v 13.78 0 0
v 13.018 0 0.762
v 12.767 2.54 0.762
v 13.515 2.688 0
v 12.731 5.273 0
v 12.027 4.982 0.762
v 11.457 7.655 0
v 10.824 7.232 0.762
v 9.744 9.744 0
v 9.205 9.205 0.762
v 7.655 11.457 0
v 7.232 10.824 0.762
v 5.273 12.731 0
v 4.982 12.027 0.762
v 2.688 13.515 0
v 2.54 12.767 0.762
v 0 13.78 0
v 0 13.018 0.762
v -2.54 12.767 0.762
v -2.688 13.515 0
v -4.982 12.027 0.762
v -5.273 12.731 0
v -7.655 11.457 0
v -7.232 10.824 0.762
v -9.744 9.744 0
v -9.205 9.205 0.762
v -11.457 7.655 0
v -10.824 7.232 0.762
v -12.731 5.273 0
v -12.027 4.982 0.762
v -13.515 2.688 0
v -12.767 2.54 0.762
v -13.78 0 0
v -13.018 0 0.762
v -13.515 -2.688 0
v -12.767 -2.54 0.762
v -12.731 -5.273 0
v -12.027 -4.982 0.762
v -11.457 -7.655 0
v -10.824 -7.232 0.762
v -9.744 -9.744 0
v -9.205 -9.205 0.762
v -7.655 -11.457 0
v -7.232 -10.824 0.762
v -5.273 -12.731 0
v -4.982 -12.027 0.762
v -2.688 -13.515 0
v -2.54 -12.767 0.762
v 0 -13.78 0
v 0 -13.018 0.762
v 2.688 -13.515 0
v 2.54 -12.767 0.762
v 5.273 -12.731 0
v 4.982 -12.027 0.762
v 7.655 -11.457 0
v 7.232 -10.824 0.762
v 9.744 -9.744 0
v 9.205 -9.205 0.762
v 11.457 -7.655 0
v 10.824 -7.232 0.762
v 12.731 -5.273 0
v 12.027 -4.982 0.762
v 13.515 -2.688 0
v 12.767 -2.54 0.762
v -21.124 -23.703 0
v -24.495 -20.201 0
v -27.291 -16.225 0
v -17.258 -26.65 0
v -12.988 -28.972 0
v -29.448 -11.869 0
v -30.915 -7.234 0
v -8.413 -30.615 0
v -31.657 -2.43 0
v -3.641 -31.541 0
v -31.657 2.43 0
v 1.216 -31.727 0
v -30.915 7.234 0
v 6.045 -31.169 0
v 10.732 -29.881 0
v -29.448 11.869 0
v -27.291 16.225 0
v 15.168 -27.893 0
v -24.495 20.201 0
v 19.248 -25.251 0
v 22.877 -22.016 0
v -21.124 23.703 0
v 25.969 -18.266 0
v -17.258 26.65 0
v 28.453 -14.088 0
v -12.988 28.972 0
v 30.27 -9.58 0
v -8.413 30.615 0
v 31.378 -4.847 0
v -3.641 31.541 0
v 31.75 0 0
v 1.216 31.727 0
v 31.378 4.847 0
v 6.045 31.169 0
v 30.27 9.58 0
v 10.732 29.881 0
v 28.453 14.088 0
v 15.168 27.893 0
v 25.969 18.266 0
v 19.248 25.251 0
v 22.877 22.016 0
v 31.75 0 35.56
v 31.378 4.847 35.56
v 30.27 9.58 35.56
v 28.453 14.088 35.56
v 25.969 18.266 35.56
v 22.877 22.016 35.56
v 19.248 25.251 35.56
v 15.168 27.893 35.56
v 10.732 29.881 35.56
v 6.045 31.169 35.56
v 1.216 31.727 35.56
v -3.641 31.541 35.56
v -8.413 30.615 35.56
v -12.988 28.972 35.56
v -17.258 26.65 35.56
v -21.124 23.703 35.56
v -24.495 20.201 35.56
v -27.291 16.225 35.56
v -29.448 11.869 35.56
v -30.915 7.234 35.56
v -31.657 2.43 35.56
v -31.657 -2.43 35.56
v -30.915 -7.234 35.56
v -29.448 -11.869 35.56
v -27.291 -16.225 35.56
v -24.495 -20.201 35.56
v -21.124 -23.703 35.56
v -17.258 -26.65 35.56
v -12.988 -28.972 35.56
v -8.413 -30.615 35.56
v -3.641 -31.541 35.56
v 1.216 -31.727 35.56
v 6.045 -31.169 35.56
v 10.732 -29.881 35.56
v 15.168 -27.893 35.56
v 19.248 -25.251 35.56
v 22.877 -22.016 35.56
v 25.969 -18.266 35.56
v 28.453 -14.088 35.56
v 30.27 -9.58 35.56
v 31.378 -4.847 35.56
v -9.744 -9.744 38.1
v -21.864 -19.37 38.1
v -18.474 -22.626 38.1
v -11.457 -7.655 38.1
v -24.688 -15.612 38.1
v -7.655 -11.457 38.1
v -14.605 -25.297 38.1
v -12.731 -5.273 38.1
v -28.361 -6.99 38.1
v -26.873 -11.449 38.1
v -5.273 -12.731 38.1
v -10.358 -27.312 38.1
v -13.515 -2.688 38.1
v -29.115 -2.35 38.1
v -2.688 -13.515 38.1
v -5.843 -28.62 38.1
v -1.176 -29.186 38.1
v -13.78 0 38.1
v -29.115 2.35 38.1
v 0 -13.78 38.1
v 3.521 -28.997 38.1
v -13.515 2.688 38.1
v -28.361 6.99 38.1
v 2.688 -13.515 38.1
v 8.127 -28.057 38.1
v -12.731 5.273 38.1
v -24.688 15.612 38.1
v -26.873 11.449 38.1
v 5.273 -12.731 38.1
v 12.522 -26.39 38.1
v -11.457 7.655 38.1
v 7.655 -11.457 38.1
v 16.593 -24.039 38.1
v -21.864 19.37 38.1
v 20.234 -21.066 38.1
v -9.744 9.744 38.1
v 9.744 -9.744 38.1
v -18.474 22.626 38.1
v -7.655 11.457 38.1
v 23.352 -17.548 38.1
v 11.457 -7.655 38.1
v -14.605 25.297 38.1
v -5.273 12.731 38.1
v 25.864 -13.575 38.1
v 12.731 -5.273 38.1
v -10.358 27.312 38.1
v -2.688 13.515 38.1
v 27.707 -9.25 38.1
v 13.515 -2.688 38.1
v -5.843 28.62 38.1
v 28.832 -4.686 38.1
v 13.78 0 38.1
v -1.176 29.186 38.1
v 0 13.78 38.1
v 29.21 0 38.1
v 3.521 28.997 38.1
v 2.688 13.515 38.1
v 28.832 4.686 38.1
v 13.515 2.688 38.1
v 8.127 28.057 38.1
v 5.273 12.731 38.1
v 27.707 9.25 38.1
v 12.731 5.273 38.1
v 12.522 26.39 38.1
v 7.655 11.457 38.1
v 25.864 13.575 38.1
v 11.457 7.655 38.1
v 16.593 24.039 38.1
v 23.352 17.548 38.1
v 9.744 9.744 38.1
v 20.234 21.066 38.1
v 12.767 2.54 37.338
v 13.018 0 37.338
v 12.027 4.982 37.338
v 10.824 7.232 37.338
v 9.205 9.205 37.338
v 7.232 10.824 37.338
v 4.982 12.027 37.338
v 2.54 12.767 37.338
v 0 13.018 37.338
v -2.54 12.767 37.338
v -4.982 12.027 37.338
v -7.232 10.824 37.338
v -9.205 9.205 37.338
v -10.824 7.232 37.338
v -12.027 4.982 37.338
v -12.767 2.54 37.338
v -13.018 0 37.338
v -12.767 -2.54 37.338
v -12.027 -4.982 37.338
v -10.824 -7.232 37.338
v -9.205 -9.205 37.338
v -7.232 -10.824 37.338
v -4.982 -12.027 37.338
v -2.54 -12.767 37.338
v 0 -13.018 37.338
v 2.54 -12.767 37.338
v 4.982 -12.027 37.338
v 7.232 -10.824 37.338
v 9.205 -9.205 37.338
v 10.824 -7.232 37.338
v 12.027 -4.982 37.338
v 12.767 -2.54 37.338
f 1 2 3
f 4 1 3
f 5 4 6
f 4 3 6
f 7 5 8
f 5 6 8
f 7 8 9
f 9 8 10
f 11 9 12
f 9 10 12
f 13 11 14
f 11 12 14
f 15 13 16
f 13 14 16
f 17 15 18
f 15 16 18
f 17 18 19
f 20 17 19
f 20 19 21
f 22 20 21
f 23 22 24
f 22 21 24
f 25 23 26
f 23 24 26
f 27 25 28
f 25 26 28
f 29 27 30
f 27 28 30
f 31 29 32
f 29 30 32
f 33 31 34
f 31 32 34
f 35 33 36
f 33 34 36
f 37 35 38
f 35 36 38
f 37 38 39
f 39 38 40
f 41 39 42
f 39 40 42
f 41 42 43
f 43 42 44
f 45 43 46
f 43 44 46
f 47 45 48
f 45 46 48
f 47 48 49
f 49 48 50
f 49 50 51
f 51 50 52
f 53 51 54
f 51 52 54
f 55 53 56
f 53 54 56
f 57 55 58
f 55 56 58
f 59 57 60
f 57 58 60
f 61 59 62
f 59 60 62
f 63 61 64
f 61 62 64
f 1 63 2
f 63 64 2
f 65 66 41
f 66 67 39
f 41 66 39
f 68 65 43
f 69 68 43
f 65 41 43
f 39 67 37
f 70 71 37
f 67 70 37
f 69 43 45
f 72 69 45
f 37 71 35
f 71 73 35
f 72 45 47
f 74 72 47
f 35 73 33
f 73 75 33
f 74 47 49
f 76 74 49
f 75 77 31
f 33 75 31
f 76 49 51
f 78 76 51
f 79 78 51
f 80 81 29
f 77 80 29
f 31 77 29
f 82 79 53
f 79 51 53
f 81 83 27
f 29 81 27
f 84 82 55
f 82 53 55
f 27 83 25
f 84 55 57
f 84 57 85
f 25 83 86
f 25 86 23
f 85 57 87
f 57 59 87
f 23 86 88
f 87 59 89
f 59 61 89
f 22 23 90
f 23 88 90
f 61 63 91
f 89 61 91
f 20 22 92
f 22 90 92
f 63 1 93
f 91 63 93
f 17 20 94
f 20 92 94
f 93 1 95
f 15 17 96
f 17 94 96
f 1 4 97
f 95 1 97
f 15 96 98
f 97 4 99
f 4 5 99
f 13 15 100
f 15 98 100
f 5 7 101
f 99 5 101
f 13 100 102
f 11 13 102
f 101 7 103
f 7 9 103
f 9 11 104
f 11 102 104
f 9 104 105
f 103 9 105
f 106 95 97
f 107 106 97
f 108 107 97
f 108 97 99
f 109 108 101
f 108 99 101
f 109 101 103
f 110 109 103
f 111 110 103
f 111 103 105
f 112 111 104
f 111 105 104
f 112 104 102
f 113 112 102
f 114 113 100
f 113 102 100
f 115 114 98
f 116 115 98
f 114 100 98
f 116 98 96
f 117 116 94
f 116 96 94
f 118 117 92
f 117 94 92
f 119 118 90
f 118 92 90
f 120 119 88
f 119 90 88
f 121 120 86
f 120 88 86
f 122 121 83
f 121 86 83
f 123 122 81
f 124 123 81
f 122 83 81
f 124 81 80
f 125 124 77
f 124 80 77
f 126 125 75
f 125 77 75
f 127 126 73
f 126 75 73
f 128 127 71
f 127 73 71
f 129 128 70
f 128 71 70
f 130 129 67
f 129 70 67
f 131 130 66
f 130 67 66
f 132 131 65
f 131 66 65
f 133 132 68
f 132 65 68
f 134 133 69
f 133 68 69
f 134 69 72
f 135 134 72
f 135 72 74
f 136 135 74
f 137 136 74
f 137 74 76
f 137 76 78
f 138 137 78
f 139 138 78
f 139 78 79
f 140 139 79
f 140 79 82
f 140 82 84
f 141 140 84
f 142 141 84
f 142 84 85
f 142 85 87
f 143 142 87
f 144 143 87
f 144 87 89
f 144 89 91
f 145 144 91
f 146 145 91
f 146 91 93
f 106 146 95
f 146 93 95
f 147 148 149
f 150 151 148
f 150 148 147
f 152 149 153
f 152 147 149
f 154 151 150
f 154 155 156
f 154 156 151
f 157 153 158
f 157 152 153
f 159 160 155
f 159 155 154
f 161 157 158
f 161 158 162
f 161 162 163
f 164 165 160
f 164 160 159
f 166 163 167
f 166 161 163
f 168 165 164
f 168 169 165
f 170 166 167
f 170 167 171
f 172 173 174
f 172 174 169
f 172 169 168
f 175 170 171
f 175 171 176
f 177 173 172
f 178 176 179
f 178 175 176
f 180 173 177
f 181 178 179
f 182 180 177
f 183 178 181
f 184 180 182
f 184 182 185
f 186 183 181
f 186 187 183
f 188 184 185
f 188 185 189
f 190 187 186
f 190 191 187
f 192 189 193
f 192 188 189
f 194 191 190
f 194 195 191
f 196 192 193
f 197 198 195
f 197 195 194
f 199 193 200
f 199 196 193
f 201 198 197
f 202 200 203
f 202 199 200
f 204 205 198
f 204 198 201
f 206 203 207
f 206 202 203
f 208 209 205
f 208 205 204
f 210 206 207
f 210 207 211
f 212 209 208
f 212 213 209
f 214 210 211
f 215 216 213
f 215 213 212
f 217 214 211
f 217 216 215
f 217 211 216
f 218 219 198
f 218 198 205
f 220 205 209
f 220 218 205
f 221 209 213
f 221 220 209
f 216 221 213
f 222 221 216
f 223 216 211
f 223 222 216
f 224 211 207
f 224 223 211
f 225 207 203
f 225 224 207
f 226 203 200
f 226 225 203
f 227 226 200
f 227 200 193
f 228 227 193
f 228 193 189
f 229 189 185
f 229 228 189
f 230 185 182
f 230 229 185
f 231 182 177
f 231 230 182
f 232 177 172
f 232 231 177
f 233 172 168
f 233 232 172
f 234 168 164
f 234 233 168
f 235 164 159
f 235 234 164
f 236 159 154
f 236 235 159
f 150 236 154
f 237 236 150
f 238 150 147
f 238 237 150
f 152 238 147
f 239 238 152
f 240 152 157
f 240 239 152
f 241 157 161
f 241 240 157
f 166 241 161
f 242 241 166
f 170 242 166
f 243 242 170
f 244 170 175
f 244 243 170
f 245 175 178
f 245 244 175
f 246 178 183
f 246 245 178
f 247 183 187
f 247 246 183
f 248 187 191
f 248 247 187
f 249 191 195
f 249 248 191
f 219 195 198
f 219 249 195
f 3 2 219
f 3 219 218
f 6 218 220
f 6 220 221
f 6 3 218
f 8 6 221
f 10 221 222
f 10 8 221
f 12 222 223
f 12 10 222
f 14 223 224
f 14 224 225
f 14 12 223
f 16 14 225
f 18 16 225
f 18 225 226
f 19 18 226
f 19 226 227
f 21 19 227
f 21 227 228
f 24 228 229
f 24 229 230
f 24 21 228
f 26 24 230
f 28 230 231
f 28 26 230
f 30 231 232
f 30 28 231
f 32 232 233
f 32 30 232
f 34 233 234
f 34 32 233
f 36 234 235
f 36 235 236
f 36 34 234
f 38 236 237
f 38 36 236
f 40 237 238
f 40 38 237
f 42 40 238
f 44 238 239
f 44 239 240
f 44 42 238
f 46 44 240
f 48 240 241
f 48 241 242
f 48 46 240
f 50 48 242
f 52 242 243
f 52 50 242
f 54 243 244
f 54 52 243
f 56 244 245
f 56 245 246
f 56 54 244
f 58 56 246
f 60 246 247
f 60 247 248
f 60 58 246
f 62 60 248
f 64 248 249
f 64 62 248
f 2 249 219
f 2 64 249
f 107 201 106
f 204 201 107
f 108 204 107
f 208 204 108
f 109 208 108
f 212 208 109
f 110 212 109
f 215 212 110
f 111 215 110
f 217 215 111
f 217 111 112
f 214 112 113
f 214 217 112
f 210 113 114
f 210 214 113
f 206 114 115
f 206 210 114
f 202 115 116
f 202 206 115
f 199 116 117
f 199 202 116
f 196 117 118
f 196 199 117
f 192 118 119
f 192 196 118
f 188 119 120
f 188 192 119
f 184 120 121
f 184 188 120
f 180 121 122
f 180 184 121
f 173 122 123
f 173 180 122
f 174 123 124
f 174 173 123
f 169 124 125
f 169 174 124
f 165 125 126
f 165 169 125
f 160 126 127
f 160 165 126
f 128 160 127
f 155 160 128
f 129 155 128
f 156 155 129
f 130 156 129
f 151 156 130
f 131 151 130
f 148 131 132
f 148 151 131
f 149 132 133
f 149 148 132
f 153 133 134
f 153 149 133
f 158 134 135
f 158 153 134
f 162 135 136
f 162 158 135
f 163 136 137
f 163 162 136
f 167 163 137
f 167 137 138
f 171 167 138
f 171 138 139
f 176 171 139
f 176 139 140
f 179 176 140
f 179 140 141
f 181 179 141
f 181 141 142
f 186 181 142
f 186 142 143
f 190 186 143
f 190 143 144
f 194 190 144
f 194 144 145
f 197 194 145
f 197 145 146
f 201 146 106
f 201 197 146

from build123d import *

# Parameters (mm, degrees)
F0_R     = 31.75
F0_R_2   = 13.0175
F1_DEPTH = 38.1
F2_SIZE  = 2.54
F3_SIZE  = 0.762


with BuildPart() as f1:
    # F0 (on Top) → F1 (new body)
    with BuildSketch(Plane.XY):
        Circle(F0_R)
        Circle(F0_R_2, mode=Mode.SUBTRACT)
    extrude(amount=F1_DEPTH)

    # F2
    f2_edges = [f1.edges().sort_by_distance(p)[0] for p in [
        (-31.75, 0, 38.1),
    ]]
    chamfer(f2_edges, length=F2_SIZE)

    # F3
    f3_edges = [f1.edges().sort_by_distance(p)[0] for p in [
        (-13.0175, 0, 38.1),
        (-13.0175, 0, 0),
    ]]
    chamfer(f3_edges, length=F3_SIZE)


solid = f1.part
